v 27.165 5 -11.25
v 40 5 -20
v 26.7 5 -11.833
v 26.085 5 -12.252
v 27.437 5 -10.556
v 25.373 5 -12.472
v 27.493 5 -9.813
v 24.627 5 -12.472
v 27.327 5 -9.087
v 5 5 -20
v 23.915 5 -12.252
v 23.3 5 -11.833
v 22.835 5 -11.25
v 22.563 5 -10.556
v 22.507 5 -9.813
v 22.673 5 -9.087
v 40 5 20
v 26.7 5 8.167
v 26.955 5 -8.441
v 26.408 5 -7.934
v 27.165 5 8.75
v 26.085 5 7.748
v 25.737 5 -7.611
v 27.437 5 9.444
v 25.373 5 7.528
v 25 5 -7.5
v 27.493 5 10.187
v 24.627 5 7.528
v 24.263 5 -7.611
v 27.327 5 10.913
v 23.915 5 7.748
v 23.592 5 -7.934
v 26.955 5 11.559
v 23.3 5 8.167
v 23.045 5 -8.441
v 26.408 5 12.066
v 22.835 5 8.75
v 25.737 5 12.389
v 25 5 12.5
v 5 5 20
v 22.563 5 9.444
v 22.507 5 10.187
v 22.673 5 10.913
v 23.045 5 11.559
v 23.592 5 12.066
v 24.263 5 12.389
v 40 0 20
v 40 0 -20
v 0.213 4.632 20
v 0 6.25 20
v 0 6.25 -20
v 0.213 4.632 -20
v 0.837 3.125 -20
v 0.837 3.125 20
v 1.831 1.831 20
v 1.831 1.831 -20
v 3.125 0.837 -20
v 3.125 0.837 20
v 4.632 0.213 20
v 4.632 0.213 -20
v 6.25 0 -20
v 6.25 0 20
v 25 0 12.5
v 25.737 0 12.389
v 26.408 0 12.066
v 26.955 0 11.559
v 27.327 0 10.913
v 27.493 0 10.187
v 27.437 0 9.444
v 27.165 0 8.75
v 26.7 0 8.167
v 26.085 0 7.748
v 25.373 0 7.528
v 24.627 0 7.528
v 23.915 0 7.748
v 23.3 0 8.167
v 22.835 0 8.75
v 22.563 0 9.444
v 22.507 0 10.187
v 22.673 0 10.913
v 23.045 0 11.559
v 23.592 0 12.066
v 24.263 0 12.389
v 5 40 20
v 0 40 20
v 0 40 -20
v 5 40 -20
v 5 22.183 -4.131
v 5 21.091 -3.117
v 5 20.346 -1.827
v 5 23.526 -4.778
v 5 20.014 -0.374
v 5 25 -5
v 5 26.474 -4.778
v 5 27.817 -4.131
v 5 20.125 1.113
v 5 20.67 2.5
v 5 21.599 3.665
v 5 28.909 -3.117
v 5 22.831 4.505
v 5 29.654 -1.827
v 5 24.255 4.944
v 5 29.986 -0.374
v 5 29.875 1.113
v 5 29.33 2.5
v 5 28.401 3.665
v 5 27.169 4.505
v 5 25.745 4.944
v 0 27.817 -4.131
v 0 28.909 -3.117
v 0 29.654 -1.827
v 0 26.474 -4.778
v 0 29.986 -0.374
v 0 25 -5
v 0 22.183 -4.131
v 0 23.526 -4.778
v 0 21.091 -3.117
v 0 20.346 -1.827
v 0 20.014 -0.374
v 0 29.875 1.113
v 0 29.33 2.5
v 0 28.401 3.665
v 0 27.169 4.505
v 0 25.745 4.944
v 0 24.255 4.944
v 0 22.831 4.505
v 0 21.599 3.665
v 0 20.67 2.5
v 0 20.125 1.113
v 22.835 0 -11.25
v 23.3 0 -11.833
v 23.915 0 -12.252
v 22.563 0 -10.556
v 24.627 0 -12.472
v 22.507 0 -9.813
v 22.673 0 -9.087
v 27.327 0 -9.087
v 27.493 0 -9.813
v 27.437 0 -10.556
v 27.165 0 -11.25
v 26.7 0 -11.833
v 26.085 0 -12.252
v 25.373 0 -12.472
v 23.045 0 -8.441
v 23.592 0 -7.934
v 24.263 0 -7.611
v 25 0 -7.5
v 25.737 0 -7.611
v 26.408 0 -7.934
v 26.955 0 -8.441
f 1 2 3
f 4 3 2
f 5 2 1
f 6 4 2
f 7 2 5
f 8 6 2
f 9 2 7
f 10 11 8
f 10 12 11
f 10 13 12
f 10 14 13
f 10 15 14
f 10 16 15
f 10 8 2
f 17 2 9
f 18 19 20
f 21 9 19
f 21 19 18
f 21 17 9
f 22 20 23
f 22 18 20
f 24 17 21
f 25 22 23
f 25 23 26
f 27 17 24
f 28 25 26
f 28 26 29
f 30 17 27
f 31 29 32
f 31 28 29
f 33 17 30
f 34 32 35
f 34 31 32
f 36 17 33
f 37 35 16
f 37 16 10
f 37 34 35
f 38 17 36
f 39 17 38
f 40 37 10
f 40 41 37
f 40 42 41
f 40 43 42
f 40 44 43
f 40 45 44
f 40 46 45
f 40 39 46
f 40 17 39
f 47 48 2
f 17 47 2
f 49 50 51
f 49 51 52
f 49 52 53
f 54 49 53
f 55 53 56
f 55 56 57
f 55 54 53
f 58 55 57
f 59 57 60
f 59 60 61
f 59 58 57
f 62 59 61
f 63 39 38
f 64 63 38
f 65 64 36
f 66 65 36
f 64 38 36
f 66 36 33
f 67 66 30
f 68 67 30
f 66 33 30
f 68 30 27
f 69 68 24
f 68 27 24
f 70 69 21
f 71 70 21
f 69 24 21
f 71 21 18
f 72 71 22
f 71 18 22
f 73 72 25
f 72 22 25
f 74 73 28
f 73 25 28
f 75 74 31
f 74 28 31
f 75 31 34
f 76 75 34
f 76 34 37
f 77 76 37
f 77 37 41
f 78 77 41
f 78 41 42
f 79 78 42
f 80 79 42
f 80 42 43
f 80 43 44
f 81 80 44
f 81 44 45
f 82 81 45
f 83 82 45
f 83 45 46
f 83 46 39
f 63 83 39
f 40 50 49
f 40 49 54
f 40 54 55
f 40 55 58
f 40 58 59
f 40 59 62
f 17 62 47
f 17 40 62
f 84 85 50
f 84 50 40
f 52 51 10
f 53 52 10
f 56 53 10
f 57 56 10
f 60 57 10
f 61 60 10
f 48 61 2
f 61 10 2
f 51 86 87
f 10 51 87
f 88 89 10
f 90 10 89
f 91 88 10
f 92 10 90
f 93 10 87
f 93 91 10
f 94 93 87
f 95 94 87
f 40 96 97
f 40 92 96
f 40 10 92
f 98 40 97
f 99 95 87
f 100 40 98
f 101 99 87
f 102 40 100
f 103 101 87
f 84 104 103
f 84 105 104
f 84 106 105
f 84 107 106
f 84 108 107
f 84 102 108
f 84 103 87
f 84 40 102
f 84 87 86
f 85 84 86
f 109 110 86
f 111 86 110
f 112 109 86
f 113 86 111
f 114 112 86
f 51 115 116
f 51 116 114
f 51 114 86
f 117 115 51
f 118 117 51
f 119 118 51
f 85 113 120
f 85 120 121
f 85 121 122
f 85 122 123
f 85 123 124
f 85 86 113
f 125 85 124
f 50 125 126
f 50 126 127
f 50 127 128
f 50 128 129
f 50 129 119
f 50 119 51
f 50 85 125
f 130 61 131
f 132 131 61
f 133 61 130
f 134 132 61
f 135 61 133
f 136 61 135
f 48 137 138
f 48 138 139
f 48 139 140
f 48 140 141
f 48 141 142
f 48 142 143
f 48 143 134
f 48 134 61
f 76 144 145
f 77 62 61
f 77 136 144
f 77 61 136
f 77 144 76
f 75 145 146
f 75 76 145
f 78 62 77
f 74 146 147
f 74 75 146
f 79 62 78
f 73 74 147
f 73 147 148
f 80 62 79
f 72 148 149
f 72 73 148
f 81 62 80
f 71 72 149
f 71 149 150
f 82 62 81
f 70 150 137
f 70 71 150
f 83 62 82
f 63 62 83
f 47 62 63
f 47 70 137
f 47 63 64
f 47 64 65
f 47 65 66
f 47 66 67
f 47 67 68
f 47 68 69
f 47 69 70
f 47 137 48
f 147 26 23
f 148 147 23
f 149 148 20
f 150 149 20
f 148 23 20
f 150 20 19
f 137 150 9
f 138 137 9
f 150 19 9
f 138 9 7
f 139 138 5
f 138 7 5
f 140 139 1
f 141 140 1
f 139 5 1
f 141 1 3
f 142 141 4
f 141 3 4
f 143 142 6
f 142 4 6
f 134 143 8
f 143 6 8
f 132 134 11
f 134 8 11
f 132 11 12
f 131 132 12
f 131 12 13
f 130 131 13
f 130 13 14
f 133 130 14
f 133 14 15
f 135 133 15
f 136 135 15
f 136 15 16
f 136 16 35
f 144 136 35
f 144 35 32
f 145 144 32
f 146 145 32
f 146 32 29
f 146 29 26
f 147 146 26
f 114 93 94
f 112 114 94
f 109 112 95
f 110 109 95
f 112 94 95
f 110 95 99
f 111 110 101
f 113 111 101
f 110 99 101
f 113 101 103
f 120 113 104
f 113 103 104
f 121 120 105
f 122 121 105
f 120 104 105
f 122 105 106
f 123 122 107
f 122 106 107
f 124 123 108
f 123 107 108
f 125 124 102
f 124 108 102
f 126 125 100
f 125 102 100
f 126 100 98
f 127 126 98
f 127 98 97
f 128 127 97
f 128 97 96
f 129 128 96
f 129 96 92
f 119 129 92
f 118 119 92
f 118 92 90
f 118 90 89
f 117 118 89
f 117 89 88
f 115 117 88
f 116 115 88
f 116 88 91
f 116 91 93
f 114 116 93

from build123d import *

# Parameters (mm, degrees)
BOSS_EXTRUDE3_DEPTH = 20
SKETCH4_R           = 2.5
CUT_EXTRUDE2_DEPTH  = 40
SKETCH5_R           = 5
CUT_EXTRUDE3_DEPTH  = 40


with BuildPart() as part:
    # Sketch1 → Boss-Extrude3 (new, symmetric)
    with BuildSketch(Plane.XY):
        with BuildLine():
            Line((0, 40), (0, 6.25))
            ThreePointArc((0, 6.25), (1.830582618, 1.830582618), (6.25, 0))
            Line((6.25, 0), (40, 0))
            Line((40, 0), (40, 5))
            Line((40, 5), (5, 5))
            Line((5, 5), (5, 40))
            Line((5, 40), (0, 40))
        make_face()
    extrude(amount=BOSS_EXTRUDE3_DEPTH, both=True)

    # Sketch4 → Cut-Extrude2 (cut)
    with BuildSketch(Plane(origin=(0, 5, 0), x_dir=(1, 0, 0), z_dir=(0, 1, 0))):
        with Locations(Location((25, -10, 0), (0, 0, 270))):
            Circle(SKETCH4_R)
        with Locations(Location((25, 10, 0), (0, 0, 270))):
            Circle(SKETCH4_R)
    extrude(amount=-CUT_EXTRUDE2_DEPTH, mode=Mode.SUBTRACT)

    # Sketch5 → Cut-Extrude3 (cut)
    with BuildSketch(Plane(origin=(5, 0, 0), x_dir=(0, 0, -1), z_dir=(1, 0, 0))):
        with Locations((0, 25)):
            Circle(SKETCH5_R)
    extrude(amount=-CUT_EXTRUDE3_DEPTH, mode=Mode.SUBTRACT)


solid = part.part
